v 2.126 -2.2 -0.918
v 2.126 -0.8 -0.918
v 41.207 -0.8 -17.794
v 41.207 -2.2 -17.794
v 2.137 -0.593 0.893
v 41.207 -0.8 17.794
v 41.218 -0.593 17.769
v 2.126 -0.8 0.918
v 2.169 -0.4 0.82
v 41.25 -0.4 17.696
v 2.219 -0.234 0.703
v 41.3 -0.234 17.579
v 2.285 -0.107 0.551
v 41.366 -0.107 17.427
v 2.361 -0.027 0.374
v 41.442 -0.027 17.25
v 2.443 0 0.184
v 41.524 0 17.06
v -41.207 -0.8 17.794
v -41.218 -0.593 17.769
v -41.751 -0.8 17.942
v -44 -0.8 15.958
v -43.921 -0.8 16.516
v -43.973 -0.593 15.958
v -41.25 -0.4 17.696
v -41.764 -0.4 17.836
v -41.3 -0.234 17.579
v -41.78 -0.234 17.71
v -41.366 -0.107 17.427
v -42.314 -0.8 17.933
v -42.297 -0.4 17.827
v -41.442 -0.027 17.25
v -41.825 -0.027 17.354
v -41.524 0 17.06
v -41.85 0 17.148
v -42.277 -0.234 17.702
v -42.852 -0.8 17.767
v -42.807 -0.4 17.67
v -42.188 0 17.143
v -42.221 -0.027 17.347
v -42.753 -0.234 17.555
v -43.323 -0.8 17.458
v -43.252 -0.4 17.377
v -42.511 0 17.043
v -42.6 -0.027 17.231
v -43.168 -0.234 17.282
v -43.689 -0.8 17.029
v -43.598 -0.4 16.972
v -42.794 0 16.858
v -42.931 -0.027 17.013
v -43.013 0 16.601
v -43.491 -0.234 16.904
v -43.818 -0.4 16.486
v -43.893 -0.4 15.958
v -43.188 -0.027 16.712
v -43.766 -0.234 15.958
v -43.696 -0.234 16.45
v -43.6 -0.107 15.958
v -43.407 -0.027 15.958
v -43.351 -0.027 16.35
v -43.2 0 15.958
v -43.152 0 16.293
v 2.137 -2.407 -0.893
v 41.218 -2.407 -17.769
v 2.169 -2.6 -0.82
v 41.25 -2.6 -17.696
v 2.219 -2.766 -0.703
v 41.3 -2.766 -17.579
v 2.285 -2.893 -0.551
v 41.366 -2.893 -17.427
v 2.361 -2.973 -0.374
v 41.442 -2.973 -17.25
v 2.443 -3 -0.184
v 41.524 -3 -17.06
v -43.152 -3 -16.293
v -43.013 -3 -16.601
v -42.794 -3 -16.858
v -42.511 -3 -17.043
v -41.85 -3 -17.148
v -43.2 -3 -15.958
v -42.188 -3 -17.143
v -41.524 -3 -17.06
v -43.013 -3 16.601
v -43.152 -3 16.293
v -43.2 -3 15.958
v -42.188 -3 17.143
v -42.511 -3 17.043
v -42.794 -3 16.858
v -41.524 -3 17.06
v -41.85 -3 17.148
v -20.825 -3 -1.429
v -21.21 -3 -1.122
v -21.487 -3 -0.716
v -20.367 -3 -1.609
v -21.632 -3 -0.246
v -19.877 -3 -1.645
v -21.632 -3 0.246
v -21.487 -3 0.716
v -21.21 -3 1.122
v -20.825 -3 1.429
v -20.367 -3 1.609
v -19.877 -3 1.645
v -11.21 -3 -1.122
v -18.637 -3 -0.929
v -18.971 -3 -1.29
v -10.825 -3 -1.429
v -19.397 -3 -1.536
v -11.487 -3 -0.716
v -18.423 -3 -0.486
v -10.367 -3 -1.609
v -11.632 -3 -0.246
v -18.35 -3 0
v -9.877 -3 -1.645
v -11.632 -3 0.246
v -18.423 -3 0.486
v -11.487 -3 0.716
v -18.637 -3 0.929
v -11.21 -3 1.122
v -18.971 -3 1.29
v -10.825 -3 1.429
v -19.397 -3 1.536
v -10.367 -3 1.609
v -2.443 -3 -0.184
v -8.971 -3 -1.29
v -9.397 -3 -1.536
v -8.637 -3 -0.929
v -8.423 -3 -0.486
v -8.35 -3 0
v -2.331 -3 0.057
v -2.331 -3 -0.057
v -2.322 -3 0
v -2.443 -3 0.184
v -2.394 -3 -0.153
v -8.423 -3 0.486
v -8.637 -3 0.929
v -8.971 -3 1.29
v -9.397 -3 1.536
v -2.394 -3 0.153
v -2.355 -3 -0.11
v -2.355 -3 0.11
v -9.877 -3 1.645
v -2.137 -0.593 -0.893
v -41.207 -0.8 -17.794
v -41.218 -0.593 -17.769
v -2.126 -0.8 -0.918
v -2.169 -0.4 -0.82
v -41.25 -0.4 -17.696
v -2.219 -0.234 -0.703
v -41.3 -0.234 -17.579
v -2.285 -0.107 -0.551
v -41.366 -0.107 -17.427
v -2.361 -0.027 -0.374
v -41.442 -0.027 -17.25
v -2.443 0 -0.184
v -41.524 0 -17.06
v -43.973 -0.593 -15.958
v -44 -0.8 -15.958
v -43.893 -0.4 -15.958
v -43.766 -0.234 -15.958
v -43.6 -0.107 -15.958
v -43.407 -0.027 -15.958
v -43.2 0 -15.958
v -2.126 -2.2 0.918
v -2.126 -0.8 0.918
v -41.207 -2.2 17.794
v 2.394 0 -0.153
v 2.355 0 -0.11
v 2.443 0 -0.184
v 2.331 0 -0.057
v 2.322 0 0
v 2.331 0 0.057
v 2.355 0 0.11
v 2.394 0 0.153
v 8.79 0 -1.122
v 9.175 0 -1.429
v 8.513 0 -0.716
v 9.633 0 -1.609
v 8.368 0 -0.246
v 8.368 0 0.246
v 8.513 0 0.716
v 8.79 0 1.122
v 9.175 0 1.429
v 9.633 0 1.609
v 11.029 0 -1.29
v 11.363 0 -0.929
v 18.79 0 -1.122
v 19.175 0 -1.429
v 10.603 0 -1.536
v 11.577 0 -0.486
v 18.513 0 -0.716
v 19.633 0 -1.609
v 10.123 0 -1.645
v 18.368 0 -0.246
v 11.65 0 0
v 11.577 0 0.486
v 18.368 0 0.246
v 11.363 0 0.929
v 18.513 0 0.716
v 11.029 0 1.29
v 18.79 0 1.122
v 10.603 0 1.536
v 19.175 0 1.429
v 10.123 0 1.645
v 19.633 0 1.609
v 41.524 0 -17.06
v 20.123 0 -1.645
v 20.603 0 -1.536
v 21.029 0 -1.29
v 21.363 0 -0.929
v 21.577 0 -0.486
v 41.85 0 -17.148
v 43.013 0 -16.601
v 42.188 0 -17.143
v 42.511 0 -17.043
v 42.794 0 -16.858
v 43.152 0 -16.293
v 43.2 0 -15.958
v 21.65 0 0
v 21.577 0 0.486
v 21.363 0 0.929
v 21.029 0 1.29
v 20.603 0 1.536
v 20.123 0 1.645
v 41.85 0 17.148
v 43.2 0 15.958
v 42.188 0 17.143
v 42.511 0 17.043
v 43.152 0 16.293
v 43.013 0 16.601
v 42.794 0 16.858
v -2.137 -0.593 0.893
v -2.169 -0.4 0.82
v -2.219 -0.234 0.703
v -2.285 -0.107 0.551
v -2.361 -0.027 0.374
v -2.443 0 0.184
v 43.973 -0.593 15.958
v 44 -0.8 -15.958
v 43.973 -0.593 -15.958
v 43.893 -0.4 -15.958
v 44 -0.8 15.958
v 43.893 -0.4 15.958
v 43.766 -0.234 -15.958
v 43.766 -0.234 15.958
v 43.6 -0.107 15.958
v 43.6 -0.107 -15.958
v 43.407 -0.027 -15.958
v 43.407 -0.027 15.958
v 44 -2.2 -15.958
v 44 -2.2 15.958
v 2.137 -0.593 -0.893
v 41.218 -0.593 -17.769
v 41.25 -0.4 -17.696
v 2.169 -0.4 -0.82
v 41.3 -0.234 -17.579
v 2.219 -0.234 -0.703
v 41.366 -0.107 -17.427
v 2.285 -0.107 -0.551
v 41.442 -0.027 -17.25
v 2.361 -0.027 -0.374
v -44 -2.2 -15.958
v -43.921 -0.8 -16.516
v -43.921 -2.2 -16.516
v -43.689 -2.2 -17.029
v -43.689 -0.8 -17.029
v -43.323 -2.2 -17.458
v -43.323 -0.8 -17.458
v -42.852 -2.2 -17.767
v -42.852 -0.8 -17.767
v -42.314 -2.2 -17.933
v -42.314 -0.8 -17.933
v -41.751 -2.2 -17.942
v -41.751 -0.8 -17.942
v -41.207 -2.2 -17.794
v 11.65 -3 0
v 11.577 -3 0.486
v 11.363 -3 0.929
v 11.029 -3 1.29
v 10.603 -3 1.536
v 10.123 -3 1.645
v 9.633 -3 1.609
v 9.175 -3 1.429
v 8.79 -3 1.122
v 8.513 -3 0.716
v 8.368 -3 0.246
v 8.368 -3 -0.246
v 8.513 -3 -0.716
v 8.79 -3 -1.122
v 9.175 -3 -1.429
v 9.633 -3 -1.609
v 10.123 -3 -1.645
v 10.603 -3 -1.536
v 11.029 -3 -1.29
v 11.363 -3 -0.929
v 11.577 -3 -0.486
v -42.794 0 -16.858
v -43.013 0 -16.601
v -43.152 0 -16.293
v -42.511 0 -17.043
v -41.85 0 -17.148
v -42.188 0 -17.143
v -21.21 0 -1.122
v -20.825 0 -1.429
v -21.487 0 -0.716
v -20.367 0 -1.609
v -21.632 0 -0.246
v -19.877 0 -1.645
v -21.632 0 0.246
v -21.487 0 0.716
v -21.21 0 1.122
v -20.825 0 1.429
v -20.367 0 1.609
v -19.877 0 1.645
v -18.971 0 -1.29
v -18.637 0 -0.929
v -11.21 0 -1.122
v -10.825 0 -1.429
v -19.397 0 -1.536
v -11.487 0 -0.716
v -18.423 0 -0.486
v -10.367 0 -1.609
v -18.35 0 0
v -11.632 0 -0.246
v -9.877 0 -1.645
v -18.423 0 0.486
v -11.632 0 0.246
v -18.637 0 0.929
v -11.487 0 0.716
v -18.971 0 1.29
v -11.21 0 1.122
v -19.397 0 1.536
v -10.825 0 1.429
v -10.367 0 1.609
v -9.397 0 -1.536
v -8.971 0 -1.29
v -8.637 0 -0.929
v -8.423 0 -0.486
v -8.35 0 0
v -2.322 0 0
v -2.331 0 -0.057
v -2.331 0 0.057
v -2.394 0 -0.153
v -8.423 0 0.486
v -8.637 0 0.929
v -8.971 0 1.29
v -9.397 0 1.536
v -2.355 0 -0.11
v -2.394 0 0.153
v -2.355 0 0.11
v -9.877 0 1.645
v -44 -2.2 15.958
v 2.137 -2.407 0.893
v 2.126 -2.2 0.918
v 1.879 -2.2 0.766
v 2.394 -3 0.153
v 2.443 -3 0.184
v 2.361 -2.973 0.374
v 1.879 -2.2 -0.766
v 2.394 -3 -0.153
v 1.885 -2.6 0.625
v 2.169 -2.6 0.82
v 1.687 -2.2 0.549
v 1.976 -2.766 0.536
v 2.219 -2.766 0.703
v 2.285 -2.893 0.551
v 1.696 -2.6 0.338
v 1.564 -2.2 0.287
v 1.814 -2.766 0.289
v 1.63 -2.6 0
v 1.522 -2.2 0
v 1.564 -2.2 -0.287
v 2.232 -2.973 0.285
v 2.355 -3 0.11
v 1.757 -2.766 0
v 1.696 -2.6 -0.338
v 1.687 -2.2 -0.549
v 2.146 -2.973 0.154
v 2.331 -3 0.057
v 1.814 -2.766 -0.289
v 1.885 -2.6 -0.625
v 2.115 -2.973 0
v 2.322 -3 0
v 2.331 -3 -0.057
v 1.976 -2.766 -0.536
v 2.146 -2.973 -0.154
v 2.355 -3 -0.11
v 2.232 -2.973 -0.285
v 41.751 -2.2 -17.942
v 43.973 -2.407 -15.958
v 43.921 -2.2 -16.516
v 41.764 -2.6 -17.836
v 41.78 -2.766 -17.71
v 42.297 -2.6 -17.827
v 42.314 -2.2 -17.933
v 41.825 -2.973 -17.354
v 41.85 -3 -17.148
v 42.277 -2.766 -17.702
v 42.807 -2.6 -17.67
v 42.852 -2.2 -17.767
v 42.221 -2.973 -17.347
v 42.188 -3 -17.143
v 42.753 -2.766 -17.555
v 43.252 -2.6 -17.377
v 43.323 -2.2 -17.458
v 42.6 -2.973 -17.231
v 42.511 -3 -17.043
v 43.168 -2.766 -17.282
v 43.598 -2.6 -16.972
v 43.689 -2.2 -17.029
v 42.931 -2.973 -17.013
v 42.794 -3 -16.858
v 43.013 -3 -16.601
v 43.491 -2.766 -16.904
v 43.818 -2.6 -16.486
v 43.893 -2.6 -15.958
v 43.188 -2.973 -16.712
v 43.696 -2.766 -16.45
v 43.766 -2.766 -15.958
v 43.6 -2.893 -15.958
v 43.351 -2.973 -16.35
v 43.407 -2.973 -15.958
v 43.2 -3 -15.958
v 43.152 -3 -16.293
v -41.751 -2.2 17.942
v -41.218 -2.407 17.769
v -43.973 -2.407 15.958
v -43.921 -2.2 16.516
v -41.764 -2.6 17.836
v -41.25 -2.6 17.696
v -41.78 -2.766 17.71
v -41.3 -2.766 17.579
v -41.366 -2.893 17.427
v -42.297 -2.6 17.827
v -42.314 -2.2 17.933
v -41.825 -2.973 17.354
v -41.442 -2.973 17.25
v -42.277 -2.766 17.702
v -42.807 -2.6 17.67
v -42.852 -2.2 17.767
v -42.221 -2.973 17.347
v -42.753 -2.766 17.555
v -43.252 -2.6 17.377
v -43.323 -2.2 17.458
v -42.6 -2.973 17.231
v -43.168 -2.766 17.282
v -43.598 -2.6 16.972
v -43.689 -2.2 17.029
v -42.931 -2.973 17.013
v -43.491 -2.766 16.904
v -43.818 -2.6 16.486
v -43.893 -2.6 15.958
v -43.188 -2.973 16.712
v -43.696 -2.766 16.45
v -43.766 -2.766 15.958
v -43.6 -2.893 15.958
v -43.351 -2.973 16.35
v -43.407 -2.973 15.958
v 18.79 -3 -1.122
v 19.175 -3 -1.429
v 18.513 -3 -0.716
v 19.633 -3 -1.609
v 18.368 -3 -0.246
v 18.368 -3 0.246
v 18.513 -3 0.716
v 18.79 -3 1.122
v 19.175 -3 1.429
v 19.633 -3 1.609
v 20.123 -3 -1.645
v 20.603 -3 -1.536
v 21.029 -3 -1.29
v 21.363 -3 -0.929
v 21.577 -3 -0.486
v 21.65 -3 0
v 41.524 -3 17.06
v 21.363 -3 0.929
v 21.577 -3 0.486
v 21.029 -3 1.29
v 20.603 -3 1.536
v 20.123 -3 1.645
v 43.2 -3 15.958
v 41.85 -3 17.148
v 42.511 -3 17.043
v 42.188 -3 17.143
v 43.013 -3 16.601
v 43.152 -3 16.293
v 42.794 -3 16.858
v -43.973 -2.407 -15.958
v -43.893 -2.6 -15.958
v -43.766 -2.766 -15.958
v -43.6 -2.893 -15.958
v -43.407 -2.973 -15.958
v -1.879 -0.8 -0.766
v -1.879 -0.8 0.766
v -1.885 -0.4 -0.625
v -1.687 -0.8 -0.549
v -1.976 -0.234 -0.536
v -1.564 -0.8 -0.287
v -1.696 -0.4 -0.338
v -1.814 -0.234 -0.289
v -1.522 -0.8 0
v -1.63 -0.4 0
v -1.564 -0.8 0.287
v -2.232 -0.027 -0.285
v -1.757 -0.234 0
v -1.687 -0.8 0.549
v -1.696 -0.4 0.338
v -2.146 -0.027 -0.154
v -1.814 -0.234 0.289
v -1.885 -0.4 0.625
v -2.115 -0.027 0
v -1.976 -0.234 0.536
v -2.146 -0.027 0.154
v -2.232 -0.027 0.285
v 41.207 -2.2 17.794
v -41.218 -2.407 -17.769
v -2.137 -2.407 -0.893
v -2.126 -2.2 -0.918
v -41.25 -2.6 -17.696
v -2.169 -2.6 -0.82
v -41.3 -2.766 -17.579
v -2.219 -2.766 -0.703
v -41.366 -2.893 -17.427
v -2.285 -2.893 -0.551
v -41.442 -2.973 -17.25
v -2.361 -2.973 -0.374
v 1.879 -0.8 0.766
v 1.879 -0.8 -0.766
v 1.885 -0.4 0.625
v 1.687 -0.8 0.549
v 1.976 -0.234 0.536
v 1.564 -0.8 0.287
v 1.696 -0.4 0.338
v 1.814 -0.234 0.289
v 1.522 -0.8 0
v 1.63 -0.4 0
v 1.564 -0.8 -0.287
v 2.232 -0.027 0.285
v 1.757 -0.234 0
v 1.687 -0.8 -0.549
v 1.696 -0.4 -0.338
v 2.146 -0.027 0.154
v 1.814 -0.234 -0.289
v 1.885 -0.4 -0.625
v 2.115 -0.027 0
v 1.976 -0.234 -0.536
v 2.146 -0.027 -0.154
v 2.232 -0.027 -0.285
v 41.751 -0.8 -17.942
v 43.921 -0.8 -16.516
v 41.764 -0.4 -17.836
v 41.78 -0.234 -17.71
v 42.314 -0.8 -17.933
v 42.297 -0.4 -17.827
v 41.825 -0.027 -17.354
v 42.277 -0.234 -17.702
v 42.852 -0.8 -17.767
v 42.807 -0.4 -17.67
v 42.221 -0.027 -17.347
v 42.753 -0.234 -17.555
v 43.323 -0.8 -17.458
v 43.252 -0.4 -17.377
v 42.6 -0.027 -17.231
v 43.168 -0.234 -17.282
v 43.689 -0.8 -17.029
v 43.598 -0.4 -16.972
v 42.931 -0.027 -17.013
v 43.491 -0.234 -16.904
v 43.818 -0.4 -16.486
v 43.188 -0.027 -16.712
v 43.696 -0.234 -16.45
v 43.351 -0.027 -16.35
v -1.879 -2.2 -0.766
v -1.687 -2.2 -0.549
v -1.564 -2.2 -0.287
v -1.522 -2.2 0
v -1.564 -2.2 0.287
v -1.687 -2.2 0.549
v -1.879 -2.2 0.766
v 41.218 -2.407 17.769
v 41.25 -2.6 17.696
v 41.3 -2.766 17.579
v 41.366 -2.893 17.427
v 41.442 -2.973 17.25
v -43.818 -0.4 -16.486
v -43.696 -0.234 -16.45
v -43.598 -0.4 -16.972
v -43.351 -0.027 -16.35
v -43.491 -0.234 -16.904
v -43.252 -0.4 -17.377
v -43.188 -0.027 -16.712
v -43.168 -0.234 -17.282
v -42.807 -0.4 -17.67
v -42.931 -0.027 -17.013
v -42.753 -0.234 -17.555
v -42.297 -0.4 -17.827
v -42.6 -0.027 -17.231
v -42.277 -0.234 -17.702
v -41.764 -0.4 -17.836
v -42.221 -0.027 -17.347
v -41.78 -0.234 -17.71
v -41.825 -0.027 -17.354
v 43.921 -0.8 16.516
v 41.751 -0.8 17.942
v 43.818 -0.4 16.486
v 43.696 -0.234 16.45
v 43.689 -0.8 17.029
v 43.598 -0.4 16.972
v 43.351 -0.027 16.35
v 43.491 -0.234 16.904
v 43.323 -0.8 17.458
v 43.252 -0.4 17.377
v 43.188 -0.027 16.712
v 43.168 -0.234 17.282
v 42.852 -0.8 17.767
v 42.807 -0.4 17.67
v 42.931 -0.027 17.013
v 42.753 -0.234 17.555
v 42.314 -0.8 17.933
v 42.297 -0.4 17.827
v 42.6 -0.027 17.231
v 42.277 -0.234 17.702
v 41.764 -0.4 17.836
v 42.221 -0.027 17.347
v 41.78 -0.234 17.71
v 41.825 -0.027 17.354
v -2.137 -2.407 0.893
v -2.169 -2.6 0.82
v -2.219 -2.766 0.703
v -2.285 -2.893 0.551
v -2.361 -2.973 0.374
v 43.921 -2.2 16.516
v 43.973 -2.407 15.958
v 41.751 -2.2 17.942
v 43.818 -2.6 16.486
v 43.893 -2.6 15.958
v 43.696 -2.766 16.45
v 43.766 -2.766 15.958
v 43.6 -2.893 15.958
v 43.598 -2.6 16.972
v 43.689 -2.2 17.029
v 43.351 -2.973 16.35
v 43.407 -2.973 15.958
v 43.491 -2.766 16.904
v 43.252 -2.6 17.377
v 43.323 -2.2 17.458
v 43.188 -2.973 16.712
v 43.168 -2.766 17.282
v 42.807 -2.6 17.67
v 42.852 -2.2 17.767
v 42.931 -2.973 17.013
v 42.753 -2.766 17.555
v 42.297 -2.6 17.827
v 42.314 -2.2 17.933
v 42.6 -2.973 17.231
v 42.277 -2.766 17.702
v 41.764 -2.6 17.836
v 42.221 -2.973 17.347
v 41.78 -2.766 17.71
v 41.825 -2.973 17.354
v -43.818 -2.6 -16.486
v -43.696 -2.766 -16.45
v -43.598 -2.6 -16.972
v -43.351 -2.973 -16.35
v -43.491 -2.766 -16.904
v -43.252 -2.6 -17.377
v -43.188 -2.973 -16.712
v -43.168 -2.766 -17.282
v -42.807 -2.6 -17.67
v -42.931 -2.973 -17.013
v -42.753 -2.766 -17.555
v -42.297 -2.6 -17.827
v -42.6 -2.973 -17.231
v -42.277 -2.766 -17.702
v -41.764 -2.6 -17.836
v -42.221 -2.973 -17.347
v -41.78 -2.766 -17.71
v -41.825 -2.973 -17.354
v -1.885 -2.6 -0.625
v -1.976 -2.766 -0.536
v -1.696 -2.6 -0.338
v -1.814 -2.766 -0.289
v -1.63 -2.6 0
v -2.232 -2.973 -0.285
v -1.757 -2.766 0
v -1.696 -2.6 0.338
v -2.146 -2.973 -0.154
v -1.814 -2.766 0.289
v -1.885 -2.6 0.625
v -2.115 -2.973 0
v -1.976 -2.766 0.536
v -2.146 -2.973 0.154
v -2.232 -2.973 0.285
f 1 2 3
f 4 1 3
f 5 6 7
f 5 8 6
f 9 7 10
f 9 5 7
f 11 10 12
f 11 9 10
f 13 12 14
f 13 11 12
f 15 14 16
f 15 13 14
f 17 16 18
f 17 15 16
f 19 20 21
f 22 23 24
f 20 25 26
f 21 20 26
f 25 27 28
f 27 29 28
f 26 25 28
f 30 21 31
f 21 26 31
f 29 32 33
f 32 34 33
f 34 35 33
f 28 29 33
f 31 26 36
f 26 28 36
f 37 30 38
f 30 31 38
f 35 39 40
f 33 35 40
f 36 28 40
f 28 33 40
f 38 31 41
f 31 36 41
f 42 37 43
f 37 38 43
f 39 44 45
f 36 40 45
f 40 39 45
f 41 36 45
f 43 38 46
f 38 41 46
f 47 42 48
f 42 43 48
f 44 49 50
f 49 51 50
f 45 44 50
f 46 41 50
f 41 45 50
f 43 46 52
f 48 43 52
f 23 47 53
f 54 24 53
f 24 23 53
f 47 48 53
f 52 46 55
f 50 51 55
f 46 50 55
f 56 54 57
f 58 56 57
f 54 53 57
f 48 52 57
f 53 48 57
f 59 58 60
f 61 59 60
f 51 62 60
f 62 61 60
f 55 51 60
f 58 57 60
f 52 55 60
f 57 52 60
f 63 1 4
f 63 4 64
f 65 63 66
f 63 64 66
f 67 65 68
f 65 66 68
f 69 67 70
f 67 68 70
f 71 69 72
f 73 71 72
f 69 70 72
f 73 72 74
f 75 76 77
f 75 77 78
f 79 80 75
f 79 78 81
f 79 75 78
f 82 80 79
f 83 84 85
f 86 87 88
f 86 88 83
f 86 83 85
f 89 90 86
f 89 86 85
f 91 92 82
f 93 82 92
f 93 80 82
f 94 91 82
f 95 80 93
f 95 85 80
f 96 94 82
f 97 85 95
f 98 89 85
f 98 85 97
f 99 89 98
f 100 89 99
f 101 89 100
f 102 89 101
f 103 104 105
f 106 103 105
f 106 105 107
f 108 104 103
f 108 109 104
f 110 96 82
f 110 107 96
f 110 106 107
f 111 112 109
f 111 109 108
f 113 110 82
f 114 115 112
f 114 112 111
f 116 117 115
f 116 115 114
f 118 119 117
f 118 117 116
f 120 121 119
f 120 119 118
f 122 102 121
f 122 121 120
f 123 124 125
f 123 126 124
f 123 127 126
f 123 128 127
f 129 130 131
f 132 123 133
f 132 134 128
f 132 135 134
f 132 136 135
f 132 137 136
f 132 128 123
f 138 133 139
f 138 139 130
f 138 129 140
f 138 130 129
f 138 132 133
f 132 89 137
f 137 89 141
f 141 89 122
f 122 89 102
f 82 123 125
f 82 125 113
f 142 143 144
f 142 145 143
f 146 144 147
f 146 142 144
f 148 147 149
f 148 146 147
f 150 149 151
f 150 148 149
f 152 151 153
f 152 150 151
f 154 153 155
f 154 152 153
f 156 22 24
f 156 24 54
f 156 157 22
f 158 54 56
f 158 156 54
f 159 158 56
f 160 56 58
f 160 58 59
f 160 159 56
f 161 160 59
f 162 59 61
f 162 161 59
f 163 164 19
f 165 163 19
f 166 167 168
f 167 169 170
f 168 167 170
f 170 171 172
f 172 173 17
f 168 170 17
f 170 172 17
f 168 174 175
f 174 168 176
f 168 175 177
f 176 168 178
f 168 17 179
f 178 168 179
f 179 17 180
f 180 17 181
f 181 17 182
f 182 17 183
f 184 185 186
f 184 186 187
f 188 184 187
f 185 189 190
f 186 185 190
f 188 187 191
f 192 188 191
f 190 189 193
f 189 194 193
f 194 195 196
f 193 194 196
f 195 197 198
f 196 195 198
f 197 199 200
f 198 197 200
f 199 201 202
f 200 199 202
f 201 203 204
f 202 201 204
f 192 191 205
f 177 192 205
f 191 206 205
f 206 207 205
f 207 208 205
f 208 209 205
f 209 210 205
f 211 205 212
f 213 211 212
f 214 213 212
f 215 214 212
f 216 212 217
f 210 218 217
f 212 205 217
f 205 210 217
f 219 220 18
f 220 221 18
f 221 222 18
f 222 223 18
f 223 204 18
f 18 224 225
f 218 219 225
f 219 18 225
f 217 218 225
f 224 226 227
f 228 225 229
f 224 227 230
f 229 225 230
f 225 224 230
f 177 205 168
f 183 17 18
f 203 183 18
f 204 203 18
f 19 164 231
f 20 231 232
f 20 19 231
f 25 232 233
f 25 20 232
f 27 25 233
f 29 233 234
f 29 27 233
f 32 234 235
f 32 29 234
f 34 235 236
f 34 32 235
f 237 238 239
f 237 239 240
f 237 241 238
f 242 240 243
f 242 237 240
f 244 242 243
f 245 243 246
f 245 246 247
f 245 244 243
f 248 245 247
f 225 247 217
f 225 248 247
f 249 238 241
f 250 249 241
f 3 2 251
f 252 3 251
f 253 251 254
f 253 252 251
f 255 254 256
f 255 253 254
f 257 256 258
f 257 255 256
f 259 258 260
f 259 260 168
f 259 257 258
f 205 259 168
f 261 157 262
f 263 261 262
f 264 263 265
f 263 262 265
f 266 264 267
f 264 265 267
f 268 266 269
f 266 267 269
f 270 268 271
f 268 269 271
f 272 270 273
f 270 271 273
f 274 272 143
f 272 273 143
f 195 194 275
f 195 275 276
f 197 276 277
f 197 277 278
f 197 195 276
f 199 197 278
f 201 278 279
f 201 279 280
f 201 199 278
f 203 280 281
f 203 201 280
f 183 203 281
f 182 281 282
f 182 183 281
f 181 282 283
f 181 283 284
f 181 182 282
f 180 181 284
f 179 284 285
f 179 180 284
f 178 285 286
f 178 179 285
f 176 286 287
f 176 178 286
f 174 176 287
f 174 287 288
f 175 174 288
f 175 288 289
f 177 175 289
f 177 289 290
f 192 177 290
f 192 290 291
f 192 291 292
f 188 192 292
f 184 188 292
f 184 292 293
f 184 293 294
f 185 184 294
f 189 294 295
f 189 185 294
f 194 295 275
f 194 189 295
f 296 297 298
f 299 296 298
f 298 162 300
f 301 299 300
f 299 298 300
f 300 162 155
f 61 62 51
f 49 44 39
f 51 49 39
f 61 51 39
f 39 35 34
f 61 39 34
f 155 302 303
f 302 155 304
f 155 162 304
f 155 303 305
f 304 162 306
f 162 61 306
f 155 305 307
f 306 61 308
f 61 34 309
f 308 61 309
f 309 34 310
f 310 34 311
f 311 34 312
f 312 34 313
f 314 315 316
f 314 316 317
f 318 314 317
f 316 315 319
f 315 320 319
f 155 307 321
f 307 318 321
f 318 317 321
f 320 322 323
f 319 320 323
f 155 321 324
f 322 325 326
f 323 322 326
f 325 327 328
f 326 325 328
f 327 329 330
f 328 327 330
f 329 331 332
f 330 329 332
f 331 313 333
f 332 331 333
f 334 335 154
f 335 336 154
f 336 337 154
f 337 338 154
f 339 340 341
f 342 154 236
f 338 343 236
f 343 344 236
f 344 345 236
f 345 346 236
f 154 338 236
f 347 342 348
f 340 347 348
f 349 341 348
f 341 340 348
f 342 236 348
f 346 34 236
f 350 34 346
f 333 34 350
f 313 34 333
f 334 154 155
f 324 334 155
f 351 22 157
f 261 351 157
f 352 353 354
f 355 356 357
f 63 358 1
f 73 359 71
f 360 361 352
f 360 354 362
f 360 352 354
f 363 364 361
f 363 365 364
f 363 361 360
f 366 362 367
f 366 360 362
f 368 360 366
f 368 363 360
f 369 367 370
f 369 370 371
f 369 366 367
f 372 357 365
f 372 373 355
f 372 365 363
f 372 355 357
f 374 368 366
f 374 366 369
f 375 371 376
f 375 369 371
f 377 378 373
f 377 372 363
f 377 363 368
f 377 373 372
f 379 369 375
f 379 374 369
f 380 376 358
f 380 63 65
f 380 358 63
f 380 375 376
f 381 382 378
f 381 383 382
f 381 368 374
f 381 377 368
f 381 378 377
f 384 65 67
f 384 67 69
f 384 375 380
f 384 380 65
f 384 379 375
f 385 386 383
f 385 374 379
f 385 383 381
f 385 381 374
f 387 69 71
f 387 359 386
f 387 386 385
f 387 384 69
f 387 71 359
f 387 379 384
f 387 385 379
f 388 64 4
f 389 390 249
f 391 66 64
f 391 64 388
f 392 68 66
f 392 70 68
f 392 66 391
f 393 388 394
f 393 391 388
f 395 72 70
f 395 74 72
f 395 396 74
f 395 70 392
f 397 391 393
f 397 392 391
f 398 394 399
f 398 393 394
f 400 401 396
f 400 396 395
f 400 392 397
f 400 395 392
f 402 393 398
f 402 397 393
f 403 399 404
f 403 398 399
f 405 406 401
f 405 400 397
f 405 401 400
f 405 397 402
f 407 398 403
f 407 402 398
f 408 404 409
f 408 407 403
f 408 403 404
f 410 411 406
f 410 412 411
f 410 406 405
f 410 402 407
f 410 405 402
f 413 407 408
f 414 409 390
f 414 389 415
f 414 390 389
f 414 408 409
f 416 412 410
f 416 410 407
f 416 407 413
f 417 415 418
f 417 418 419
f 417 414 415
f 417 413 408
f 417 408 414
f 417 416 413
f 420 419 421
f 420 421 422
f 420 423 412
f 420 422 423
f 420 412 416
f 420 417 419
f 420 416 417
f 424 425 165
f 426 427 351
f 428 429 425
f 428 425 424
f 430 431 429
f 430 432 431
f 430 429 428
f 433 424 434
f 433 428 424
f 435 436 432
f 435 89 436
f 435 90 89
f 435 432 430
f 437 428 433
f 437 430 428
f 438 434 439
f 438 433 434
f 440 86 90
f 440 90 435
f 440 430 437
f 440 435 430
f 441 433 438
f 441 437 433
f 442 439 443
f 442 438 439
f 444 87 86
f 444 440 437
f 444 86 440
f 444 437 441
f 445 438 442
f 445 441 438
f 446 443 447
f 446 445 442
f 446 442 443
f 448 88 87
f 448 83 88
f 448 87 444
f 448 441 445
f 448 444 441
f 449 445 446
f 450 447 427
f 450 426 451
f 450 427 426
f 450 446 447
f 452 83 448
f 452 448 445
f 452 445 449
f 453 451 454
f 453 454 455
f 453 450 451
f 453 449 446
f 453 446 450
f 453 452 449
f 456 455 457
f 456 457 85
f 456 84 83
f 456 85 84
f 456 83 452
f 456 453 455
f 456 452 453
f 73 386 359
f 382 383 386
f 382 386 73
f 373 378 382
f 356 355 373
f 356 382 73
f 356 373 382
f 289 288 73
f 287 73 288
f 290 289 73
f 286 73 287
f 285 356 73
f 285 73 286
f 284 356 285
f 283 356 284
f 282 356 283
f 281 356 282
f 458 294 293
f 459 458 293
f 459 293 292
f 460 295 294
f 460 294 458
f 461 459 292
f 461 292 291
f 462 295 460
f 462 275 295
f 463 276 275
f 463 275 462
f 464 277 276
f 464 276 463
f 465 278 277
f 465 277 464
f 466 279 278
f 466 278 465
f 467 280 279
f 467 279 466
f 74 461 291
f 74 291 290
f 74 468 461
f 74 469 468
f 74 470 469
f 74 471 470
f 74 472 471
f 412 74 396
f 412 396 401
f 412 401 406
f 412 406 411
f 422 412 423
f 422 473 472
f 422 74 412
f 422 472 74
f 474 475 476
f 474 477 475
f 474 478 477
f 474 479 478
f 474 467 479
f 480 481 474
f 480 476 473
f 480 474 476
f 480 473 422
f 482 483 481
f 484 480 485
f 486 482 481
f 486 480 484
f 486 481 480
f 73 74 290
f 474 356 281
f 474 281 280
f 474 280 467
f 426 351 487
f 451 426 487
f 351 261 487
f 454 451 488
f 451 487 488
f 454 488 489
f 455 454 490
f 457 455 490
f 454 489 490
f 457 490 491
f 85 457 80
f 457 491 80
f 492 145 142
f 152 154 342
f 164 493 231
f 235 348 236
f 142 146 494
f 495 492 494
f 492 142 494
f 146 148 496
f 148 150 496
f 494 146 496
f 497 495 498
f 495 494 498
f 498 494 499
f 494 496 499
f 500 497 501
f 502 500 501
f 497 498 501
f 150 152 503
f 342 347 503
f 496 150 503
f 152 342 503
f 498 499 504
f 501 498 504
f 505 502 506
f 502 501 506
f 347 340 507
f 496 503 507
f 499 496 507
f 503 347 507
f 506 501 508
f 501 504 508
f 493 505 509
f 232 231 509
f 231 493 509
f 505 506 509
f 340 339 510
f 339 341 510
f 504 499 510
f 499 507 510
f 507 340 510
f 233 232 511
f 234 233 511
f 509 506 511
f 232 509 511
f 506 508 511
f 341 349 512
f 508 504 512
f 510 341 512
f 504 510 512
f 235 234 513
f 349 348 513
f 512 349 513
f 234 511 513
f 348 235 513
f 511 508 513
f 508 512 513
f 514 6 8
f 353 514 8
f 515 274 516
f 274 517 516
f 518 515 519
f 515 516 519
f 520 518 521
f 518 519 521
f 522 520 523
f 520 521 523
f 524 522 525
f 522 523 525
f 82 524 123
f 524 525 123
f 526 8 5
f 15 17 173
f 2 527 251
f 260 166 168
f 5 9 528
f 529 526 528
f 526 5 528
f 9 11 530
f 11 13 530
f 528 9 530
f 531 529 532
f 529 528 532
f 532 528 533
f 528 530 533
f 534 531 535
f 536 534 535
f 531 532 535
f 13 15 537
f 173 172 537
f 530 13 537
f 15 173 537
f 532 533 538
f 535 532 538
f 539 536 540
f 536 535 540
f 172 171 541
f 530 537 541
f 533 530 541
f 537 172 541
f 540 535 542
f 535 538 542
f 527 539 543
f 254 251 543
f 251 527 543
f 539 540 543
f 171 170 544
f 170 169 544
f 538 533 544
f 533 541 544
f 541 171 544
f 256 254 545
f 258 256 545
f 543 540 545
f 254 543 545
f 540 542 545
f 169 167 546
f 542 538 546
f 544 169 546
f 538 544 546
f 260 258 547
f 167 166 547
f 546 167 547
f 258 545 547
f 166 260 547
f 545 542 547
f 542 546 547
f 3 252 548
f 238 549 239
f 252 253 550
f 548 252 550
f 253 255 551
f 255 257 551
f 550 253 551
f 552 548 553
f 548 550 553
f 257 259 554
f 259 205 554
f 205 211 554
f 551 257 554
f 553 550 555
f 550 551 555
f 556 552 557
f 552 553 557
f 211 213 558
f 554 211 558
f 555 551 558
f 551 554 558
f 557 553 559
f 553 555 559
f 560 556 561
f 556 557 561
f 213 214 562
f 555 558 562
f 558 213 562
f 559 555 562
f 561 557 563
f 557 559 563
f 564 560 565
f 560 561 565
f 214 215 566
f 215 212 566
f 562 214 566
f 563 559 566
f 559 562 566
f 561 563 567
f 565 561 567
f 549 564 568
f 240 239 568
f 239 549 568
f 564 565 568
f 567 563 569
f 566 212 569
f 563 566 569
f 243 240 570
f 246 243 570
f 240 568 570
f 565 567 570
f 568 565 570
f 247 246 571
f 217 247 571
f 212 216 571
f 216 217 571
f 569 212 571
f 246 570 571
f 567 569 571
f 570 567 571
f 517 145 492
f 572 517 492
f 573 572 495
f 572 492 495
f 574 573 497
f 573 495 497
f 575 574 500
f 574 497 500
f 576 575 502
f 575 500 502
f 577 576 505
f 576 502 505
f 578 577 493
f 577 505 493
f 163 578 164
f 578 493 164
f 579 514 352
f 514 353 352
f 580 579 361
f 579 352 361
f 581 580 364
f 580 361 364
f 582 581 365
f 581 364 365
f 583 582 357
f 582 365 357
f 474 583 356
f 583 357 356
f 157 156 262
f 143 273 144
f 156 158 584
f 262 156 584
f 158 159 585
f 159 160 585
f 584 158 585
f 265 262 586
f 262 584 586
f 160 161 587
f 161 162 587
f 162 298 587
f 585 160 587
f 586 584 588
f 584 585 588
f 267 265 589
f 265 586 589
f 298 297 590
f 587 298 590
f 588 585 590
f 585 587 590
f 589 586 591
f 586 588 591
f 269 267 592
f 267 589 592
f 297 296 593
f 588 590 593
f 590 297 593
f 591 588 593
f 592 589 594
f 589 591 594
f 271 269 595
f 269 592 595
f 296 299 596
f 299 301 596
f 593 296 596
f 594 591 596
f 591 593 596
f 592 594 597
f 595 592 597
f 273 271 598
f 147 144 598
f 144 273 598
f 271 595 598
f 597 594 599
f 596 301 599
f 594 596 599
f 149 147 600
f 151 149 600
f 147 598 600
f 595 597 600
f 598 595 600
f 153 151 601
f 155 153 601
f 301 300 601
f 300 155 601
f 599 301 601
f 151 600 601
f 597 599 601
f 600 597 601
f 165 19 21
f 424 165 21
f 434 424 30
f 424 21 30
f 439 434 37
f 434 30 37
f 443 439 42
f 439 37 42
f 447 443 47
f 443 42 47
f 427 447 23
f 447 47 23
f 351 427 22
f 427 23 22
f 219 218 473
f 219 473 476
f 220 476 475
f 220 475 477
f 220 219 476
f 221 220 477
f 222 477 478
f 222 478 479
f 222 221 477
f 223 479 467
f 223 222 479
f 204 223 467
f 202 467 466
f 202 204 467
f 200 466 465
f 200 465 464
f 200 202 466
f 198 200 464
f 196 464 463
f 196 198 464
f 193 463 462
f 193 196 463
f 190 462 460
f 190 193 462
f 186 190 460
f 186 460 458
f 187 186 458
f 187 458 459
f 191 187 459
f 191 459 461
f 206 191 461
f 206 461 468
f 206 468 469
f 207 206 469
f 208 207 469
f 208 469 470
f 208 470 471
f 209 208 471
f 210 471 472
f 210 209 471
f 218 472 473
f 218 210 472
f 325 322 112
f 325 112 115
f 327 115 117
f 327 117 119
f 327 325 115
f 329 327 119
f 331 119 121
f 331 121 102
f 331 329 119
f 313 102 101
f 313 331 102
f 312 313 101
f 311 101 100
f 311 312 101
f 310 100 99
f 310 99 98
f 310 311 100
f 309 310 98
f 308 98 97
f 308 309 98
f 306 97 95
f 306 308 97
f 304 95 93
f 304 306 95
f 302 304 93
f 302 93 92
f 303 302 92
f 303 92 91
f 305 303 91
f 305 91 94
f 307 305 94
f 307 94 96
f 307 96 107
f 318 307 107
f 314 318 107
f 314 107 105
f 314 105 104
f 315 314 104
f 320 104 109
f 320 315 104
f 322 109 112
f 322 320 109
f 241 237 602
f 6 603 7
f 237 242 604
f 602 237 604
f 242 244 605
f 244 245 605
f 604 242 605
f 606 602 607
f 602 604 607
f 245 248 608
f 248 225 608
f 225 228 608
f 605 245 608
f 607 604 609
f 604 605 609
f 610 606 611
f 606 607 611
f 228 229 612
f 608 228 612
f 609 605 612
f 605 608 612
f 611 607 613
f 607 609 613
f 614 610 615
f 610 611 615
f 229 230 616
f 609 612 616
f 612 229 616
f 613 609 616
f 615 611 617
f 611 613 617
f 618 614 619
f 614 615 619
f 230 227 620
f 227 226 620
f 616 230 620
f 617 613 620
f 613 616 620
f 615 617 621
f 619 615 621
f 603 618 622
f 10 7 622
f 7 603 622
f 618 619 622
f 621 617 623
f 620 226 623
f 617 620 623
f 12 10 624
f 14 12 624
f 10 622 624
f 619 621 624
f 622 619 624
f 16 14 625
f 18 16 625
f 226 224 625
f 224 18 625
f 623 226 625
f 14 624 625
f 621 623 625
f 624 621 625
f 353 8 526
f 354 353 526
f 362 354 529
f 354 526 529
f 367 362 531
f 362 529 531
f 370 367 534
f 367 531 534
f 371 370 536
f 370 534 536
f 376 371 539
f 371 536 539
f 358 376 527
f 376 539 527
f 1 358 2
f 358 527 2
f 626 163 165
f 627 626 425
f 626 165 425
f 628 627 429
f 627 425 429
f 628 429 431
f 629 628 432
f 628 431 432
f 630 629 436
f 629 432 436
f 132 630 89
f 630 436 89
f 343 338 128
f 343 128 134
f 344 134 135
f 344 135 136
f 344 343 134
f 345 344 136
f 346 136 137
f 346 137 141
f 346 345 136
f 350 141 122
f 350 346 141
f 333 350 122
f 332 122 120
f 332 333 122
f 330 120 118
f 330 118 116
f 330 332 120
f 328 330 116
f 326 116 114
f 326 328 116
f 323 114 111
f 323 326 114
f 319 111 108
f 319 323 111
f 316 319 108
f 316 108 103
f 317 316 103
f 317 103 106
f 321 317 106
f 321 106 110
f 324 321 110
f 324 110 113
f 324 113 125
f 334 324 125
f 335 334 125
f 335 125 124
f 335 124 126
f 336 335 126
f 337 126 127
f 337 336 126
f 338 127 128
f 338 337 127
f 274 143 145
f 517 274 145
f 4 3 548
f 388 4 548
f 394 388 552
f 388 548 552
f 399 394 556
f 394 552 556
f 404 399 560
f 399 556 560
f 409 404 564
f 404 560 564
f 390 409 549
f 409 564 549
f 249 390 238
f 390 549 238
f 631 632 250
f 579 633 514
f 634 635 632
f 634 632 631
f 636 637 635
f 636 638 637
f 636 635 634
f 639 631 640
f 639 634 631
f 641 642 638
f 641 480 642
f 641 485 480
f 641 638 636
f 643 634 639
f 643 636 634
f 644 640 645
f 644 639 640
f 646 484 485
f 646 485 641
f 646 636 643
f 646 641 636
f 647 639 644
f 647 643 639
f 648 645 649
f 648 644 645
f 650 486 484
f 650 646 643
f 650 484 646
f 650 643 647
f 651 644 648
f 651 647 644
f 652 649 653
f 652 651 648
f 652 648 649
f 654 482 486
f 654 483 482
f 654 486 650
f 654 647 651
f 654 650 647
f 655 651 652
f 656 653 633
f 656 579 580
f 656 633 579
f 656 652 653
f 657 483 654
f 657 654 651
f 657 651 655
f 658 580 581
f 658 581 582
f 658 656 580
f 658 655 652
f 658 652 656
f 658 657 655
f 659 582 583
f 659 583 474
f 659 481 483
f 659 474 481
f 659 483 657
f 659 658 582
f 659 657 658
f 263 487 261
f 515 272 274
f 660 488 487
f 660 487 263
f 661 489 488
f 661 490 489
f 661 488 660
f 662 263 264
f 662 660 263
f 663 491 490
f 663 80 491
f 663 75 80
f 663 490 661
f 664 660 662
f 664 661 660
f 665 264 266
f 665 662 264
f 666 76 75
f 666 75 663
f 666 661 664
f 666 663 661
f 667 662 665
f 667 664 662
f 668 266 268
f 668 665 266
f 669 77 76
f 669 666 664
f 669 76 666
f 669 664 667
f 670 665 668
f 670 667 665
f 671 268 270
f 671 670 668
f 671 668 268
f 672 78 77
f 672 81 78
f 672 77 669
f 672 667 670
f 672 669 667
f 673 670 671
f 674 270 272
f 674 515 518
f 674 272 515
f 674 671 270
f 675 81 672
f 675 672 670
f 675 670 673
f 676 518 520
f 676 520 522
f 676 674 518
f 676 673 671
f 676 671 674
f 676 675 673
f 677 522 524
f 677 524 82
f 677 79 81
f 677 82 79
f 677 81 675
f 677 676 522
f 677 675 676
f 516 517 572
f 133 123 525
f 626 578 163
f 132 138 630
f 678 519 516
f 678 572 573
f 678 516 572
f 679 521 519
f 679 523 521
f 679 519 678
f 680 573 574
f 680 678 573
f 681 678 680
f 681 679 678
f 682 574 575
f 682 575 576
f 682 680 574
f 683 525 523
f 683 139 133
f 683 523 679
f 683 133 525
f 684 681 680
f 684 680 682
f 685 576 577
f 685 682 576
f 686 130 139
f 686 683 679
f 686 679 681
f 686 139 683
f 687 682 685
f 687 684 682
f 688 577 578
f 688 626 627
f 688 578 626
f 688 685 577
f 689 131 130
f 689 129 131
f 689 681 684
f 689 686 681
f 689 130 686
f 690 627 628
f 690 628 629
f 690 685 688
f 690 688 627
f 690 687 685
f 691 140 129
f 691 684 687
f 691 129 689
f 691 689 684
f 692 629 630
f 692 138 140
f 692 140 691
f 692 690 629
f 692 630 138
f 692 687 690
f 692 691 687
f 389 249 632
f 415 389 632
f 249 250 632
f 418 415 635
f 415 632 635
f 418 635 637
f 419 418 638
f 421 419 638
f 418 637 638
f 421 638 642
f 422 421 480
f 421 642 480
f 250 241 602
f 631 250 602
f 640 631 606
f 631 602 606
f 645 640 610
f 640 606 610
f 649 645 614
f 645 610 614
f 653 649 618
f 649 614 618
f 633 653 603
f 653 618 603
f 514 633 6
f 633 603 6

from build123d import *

# Parameters (mm, degrees)
F0_R     = 1.65
F1_DEPTH = 3
F2_R     = 0.8


with BuildPart() as f1:
    # F0 (on Front) → F1 (new body)
    with BuildSketch(Plane.XZ):
        with BuildLine():
            ThreePointArc((-2.126039, -0.918062), (-1.522475, 0), (-2.126039, 0.918062))
            Line((-2.126039, 0.918062), (-41.207128, 17.793987))
            ThreePointArc((-41.207128, 17.793987), (-43.098694, 17.629051), (-44, 15.957862))
            Line((-44, 15.957862), (-44, -15.957862))
            ThreePointArc((-44, -15.957862), (-43.098694, -17.629051), (-41.207128, -17.793987))
            Line((-41.207128, -17.793987), (-2.126039, -0.918062))
        make_face()
        with Locations((-20, 0)):
            Circle(F0_R, mode=Mode.SUBTRACT)
        with Locations((-10, 0)):
            Circle(F0_R, mode=Mode.SUBTRACT)
        with BuildLine():
            Line((41.207128, 17.793987), (2.126039, 0.918062))
            ThreePointArc((2.126039, 0.918062), (1.522475, 0), (2.126039, -0.918062))
            Line((2.126039, -0.918062), (41.207128, -17.793987))
            ThreePointArc((41.207128, -17.793987), (43.098694, -17.629051), (44, -15.957862))
            Line((44, -15.957862), (44, 15.957862))
            ThreePointArc((44, 15.957862), (43.098694, 17.629051), (41.207128, 17.793987))
        make_face()
        with Locations((10, 0)):
            Circle(F0_R, mode=Mode.SUBTRACT)
        with Locations((20, 0)):
            Circle(F0_R, mode=Mode.SUBTRACT)
    extrude(amount=F1_DEPTH)

    # F2
    f2_edges = [f1.edges().sort_by_distance(p)[0] for p in [
        (-44, -3, 0),
        (-21.666584, 0, 9.356025),
        (21.666584, 0, 9.356025),
        (21.666584, -3, 9.356025),
    ]]
    fillet(f2_edges, radius=F2_R)


solid = f1.part
